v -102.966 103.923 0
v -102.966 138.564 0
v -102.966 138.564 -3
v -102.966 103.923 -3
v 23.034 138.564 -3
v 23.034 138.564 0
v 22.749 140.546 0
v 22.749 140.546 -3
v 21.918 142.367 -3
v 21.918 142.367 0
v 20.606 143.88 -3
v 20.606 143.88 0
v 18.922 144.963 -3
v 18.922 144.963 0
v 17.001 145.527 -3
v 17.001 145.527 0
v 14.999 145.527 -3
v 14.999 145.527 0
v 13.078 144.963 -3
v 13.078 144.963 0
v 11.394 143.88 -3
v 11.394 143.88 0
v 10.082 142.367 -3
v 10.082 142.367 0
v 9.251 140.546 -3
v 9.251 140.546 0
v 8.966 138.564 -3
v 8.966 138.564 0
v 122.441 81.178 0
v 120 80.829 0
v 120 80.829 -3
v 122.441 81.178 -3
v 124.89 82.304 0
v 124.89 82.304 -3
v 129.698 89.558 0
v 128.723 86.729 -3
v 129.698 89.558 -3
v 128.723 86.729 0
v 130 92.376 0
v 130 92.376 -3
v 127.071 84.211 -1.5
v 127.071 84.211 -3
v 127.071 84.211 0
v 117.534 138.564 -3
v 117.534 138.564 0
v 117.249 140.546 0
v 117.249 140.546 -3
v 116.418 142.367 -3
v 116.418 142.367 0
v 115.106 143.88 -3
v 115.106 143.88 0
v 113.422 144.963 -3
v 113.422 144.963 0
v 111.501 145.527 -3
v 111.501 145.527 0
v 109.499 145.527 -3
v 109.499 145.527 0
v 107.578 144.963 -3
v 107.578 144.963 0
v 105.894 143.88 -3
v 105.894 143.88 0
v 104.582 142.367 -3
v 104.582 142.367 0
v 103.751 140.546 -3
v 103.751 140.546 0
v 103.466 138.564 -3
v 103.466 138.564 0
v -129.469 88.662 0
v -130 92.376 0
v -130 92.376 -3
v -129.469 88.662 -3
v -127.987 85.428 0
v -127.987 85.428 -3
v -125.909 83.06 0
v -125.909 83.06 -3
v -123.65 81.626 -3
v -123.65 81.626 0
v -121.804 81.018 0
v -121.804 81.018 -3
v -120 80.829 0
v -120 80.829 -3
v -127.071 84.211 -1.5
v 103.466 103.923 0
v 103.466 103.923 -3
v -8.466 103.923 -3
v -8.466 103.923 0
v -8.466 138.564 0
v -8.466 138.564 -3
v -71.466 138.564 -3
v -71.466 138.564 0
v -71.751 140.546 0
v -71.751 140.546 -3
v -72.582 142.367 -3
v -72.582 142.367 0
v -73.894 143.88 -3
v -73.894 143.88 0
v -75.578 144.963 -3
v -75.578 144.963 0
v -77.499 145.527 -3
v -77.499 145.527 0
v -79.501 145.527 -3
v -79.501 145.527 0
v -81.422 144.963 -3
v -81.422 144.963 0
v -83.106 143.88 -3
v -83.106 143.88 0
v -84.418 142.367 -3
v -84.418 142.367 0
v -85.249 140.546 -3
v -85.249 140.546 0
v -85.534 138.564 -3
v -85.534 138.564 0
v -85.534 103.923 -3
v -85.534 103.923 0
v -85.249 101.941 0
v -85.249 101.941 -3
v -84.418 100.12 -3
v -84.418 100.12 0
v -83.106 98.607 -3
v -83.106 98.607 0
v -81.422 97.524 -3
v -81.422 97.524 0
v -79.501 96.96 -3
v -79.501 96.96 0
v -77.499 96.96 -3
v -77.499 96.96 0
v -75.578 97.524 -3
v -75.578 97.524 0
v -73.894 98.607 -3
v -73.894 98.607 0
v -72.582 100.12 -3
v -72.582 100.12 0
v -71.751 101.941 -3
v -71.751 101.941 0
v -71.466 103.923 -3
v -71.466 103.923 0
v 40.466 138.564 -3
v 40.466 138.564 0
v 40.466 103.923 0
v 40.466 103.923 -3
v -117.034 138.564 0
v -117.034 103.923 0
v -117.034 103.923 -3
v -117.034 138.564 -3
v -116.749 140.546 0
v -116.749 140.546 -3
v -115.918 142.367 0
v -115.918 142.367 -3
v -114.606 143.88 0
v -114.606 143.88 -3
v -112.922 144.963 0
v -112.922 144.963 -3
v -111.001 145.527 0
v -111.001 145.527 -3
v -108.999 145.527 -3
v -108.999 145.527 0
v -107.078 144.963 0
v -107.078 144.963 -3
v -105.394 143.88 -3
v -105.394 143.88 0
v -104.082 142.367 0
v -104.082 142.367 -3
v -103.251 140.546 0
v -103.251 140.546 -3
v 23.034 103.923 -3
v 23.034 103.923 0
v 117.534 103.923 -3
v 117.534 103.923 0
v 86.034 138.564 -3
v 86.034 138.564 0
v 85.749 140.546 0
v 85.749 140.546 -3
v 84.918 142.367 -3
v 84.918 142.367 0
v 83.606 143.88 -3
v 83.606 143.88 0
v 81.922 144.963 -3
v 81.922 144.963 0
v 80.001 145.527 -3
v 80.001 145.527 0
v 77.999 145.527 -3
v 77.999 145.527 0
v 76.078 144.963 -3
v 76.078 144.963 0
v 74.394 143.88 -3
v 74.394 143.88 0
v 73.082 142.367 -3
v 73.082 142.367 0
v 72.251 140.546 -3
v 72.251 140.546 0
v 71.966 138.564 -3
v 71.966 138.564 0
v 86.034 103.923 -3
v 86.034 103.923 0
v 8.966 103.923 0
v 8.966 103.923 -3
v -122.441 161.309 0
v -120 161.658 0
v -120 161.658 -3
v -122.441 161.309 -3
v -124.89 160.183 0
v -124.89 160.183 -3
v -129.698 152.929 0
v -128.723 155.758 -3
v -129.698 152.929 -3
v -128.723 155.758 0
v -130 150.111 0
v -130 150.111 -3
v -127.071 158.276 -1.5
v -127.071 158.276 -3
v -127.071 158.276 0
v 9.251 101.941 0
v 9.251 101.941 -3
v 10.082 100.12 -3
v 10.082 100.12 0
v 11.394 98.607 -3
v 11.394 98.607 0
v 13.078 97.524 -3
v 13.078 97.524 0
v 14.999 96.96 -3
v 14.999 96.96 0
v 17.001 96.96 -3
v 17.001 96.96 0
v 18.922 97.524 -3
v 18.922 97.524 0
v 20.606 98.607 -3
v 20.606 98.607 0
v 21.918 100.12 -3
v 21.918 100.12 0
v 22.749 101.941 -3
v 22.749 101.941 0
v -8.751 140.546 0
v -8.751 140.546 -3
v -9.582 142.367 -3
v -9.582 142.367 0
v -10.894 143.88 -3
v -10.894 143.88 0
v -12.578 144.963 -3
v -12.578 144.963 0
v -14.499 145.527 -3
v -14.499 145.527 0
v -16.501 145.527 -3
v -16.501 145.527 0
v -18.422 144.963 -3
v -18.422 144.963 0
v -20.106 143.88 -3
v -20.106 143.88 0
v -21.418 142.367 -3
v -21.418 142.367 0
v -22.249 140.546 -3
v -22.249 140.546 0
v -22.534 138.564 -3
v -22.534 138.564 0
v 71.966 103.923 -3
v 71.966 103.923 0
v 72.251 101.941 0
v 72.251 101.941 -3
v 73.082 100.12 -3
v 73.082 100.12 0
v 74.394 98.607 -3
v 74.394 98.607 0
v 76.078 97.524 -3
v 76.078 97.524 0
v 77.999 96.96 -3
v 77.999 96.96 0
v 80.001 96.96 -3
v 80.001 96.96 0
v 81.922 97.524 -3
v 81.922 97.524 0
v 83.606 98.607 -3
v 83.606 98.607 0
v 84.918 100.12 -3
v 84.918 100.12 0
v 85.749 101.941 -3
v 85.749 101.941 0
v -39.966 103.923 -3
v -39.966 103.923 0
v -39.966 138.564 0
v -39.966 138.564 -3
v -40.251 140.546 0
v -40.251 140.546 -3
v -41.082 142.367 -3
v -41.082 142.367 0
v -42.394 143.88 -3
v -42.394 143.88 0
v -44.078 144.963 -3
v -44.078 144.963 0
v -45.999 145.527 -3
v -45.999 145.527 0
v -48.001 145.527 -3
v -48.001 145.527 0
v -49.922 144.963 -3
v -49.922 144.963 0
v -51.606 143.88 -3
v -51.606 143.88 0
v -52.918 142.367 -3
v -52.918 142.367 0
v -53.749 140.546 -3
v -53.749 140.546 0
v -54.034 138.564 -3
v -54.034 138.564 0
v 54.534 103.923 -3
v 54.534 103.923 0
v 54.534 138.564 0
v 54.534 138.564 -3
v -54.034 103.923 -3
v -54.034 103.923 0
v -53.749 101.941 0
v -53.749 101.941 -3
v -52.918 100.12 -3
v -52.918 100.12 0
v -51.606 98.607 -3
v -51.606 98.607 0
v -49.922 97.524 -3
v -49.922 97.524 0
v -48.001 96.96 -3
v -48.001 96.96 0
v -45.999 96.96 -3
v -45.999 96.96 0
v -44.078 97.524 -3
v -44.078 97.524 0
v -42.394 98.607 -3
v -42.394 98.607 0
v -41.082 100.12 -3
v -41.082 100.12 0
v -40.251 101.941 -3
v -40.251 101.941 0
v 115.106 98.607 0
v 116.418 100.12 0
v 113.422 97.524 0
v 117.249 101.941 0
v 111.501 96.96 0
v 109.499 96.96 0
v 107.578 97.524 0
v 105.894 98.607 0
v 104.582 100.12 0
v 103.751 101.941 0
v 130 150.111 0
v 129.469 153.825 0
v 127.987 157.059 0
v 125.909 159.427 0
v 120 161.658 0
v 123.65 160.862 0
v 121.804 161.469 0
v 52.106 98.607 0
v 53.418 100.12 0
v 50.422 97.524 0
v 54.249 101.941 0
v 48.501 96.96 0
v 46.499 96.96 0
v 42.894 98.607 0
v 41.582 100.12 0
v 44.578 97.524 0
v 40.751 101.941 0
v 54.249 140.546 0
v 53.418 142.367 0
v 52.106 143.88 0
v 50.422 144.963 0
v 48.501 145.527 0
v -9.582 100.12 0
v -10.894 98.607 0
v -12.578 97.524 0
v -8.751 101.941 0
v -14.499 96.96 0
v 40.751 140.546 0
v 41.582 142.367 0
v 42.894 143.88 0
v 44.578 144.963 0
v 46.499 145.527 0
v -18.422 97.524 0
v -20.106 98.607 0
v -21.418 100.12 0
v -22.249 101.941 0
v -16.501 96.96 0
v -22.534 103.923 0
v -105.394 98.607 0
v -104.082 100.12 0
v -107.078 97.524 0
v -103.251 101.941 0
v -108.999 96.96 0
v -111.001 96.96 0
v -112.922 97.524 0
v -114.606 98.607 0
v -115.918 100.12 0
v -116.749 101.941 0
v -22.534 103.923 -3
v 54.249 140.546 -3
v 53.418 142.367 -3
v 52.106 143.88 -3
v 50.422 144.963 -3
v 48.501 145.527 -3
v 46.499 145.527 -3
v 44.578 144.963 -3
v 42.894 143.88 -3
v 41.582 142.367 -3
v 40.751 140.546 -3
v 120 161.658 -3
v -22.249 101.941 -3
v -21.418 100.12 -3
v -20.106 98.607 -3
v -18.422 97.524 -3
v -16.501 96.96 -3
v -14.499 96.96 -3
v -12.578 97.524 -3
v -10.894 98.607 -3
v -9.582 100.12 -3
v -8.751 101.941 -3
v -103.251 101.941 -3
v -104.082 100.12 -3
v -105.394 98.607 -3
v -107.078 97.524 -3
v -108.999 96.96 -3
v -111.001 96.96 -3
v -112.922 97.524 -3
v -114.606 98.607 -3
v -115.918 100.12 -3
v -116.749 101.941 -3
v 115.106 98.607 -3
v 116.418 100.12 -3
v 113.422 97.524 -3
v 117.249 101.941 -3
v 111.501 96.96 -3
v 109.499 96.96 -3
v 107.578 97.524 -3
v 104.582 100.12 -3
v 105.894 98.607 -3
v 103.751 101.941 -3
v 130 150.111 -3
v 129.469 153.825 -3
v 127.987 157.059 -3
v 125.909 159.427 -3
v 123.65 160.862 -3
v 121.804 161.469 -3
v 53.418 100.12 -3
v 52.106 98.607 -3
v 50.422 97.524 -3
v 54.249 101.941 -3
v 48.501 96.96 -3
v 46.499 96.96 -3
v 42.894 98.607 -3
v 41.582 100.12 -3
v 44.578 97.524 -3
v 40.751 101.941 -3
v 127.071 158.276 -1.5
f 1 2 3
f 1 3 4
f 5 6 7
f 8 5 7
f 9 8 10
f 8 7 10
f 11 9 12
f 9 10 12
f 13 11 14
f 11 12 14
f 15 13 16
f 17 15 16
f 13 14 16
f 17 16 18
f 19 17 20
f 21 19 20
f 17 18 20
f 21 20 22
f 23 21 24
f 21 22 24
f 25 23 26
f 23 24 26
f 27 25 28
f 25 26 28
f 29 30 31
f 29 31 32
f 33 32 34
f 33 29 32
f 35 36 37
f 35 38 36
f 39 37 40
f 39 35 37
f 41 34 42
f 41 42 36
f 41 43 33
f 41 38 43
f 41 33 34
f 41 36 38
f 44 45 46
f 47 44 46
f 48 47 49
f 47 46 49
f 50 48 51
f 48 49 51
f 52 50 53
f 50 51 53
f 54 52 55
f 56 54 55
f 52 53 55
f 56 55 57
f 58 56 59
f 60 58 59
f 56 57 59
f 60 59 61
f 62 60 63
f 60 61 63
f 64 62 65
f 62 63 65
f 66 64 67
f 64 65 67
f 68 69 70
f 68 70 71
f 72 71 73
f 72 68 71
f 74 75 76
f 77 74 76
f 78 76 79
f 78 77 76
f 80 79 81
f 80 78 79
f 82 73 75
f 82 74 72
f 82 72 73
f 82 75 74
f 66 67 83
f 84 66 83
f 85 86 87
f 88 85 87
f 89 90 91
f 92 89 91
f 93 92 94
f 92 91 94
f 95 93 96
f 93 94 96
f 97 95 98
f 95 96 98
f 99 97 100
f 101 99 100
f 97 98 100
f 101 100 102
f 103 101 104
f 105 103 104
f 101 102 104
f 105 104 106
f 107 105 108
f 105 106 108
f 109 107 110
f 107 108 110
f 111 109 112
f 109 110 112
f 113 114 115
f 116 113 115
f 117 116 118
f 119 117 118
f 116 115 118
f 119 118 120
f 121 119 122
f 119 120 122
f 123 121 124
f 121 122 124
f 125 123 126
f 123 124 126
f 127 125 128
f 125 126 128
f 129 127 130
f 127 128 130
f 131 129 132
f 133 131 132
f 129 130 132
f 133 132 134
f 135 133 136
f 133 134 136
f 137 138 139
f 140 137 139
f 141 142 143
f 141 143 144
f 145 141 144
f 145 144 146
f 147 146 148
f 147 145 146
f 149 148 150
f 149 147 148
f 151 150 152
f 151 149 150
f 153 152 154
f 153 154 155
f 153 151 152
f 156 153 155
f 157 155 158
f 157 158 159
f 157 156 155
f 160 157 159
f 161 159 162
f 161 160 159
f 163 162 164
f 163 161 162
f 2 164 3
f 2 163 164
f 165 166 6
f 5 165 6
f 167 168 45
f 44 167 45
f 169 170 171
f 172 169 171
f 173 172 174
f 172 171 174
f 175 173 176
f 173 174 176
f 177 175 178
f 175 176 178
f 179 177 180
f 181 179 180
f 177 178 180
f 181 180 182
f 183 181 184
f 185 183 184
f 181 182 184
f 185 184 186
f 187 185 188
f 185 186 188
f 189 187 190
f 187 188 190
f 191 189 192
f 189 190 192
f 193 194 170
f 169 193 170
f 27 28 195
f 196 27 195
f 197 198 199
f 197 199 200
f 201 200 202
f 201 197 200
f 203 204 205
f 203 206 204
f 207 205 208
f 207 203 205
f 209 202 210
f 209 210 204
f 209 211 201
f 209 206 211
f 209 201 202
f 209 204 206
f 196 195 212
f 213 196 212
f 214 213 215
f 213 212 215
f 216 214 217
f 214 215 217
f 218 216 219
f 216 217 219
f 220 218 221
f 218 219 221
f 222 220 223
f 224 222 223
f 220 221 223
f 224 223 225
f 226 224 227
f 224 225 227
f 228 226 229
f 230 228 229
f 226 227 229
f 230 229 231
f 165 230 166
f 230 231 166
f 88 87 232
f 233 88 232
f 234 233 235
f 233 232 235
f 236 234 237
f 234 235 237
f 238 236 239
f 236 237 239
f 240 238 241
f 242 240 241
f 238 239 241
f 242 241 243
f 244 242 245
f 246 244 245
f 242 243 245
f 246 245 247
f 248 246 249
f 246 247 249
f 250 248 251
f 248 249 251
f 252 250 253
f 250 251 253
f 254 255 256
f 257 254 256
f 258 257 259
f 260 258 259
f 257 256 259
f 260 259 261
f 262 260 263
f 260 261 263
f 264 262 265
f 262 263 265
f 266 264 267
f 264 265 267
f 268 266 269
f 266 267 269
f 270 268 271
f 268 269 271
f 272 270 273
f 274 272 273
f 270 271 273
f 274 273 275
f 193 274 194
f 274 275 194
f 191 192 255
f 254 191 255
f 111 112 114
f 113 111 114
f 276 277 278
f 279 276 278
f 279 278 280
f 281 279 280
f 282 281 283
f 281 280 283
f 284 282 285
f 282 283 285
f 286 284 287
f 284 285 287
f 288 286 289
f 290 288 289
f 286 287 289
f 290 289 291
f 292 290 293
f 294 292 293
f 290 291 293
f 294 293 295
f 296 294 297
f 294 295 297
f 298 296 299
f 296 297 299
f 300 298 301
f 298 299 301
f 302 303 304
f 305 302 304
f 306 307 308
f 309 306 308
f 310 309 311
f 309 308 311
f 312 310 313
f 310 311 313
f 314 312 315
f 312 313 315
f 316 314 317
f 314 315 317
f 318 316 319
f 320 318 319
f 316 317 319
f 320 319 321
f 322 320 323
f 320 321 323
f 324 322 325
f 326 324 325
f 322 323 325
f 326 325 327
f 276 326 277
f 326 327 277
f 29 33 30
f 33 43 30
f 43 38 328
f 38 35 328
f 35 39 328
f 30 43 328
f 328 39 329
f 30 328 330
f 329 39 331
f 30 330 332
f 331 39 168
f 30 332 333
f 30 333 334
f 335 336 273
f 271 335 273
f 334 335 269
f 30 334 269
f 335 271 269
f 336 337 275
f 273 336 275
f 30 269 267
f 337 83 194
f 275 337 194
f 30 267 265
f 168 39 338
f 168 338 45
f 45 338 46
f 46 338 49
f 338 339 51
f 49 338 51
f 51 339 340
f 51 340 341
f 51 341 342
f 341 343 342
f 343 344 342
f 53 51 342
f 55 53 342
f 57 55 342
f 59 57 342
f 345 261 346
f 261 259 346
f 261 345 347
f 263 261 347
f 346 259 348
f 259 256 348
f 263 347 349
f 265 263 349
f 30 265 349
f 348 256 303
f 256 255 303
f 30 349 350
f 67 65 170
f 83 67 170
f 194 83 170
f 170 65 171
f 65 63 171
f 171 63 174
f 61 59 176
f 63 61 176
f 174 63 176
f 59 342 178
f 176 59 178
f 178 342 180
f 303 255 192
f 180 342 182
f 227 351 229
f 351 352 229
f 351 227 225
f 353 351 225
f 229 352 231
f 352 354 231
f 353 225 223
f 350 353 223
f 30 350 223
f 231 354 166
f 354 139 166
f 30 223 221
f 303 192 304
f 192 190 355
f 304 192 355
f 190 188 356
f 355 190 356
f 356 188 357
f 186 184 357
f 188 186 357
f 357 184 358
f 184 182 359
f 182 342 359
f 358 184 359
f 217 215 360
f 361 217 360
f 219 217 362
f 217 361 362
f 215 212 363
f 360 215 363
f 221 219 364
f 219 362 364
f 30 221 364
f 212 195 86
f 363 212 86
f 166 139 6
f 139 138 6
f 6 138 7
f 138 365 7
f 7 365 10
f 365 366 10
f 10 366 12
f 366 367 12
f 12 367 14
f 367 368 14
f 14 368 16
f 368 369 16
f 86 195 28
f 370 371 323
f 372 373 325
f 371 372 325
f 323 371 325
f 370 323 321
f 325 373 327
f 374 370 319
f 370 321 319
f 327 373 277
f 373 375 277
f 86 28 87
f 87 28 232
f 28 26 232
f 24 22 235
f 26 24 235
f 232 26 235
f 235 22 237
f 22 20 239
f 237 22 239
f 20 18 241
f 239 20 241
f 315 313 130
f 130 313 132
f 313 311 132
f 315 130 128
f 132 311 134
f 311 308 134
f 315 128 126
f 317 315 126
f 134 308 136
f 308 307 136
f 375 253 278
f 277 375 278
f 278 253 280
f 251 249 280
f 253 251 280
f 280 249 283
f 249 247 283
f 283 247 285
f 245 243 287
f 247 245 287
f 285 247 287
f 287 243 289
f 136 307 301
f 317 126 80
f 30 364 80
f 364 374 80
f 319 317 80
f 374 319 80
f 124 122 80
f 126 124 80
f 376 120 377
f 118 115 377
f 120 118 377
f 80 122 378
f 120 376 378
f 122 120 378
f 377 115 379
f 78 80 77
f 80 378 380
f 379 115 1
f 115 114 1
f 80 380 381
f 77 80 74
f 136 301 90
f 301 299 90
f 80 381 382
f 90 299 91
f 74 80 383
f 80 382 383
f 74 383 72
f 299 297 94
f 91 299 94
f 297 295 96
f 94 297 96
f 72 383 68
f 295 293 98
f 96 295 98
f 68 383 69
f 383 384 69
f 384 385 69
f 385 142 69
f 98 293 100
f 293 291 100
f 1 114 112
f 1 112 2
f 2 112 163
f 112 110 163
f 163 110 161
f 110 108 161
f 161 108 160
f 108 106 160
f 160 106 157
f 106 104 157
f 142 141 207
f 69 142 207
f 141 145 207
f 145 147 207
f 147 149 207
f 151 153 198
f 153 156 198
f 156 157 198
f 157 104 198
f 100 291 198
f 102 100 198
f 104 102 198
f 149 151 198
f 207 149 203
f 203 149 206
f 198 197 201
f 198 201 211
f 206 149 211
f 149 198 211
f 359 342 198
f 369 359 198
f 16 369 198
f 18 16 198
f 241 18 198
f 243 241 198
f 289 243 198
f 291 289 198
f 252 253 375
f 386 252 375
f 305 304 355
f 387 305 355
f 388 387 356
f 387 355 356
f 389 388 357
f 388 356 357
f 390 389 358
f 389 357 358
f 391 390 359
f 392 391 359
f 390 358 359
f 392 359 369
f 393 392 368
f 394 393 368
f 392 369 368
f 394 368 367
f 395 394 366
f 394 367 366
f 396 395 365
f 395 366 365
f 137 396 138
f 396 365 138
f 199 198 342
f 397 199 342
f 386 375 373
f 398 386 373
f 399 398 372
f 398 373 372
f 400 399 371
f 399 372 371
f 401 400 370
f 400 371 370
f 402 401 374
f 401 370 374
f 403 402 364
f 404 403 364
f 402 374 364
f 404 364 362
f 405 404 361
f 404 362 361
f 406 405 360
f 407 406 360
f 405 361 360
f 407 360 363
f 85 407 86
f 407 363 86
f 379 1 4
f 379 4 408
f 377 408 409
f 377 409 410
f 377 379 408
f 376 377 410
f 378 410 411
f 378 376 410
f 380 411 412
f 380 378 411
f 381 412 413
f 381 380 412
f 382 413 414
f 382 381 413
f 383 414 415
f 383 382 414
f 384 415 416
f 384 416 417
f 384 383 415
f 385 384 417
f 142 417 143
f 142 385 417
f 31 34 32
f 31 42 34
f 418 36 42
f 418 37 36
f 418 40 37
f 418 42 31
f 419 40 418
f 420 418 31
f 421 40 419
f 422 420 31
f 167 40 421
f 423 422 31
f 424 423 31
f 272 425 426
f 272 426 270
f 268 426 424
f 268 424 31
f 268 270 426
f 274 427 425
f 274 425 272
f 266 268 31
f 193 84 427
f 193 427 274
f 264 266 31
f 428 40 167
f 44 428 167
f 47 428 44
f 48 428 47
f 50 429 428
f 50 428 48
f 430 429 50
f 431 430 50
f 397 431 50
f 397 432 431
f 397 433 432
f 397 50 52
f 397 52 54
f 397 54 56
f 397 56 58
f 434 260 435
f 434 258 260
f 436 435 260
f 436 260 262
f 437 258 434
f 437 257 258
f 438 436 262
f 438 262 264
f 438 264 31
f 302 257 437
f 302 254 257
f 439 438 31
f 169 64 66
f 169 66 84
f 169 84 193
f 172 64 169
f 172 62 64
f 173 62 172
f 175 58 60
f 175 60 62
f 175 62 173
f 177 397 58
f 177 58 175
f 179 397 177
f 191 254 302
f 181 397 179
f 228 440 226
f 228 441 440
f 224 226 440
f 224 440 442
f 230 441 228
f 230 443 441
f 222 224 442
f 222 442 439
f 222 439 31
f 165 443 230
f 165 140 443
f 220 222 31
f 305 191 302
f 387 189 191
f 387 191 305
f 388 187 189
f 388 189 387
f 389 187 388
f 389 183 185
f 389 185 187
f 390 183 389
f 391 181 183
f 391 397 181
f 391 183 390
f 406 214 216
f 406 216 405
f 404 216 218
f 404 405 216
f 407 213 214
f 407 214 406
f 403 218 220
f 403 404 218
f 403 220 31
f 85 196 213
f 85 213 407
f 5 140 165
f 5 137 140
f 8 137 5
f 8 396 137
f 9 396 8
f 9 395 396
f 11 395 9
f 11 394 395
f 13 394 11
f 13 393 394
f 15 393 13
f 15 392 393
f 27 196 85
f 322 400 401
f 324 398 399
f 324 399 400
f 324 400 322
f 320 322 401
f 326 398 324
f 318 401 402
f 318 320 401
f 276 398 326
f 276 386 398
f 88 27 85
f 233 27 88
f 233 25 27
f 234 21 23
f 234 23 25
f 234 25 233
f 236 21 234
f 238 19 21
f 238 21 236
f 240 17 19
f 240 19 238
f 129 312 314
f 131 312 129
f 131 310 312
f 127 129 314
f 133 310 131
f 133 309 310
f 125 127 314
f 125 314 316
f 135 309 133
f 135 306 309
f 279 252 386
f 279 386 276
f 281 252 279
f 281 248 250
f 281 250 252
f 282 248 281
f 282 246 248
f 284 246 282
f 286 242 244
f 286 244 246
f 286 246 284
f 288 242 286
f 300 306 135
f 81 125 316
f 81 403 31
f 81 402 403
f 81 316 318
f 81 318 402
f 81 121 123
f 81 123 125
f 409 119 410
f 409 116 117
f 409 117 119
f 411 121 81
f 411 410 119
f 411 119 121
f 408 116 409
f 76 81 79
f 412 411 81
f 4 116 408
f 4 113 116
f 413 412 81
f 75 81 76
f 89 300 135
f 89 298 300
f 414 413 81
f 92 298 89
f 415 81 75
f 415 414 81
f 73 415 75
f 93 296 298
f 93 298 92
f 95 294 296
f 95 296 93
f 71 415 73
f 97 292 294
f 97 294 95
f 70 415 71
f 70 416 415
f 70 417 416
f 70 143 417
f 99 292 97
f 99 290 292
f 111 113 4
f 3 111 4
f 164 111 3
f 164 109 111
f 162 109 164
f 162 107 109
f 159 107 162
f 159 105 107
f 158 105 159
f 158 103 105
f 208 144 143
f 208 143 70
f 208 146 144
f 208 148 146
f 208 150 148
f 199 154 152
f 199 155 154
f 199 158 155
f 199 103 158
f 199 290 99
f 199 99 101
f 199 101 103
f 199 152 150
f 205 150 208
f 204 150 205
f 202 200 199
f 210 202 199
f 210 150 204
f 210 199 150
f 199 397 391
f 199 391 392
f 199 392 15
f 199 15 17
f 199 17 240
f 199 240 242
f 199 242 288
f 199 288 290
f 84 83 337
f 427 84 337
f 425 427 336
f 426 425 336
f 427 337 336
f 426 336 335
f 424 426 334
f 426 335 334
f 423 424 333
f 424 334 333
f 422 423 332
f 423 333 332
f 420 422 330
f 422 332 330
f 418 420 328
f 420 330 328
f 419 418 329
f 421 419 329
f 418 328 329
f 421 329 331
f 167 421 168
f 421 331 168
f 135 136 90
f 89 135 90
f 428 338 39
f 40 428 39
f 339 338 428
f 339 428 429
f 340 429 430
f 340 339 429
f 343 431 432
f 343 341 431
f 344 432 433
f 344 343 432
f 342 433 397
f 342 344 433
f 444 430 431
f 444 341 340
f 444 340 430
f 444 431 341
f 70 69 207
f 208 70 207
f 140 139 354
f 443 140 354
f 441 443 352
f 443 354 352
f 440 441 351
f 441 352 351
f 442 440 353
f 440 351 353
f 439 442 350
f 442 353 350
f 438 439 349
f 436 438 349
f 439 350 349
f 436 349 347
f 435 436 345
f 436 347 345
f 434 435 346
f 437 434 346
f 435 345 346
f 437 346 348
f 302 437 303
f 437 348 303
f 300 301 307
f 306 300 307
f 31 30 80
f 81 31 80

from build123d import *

# Parameters (mm, degrees)
BOSS_EXTRUDE1_DEPTH = 3


with BuildPart() as part:
    # Sketch1 → Boss-Extrude1 (new body)
    with BuildSketch(Plane.XY):
        with BuildLine():
            Line((120, 80.829037687), (-120, 80.829037687))
            add(Edge.make_bspline(
                [(-130, 92.37604307), (-130, 80.829037687), (-120, 80.829037687)],
                knots=[1.570796327, 1.570796327, 1.570796327, 3.141592654, 3.141592654, 3.141592654], degree=2, weights=[1, 0.707106781, 1]))
            Line((-130, 92.37604307), (-130, 150.111069989))
            add(Edge.make_bspline(
                [(-120, 161.658075373), (-130, 161.658075373), (-130, 150.111069989)],
                knots=[0, 0, 0, 1.570796327, 1.570796327, 1.570796327], degree=2, weights=[1, 0.707106781, 1]))
            Line((-120, 161.658075373), (120, 161.658075373))
            add(Edge.make_bspline(
                [(130, 150.111069989), (130, 161.658075373), (120, 161.658075373)],
                knots=[4.71238898, 4.71238898, 4.71238898, 6.283185307, 6.283185307, 6.283185307], degree=2, weights=[1, 0.707106781, 1]))
            Line((130, 150.111069989), (130, 92.37604307))
            add(Edge.make_bspline(
                [(120, 80.829037687), (130, 80.829037687), (130, 92.37604307)],
                knots=[3.141592654, 3.141592654, 3.141592654, 4.71238898, 4.71238898, 4.71238898], degree=2, weights=[1, 0.707106781, 1]))
        make_face()
        with BuildLine():
            Line((-102.965755224, 138.564064606), (-102.965755224, 103.923048454))
            ThreePointArc((-102.965755224, 103.923048454), (-110, 96.888803678), (-117.034244776, 103.923048454))
            Line((-117.034244776, 103.923048454), (-117.034244776, 138.564064606))
            ThreePointArc((-117.034244776, 138.564064606), (-110, 145.598309381), (-102.965755224, 138.564064606))
        make_face(mode=Mode.SUBTRACT)
        with BuildLine():
            Line((-85.534244776, 138.564064606), (-85.534244776, 103.923048454))
            ThreePointArc((-85.534244776, 103.923048454), (-78.5, 96.888803678), (-71.465755224, 103.923048454))
            Line((-71.465755224, 103.923048454), (-71.465755224, 138.564064606))
            ThreePointArc((-71.465755224, 138.564064606), (-78.5, 145.598309381), (-85.534244776, 138.564064606))
        make_face(mode=Mode.SUBTRACT)
        with BuildLine():
            Line((-54.034244776, 138.564064606), (-54.034244776, 103.923048454))
            ThreePointArc((-54.034244776, 103.923048454), (-47, 96.888803678), (-39.965755224, 103.923048454))
            Line((-39.965755224, 103.923048454), (-39.965755224, 138.564064606))
            ThreePointArc((-39.965755224, 138.564064606), (-47, 145.598309381), (-54.034244776, 138.564064606))
        make_face(mode=Mode.SUBTRACT)
        with BuildLine():
            Line((-22.534244776, 138.564064606), (-22.534244776, 103.923048454))
            ThreePointArc((-22.534244776, 103.923048454), (-15.5, 96.888803678), (-8.465755224, 103.923048454))
            Line((-8.465755224, 103.923048454), (-8.465755224, 138.564064606))
            ThreePointArc((-8.465755224, 138.564064606), (-15.5, 145.598309381), (-22.534244776, 138.564064606))
        make_face(mode=Mode.SUBTRACT)
        with BuildLine():
            Line((8.965755224, 138.564064606), (8.965755224, 103.923048454))
            ThreePointArc((8.965755224, 103.923048454), (16, 96.888803678), (23.034244776, 103.923048454))
            Line((23.034244776, 103.923048454), (23.034244776, 138.564064606))
            ThreePointArc((23.034244776, 138.564064606), (16, 145.598309381), (8.965755224, 138.564064606))
        make_face(mode=Mode.SUBTRACT)
        with BuildLine():
            Line((40.465755224, 138.564064606), (40.465755224, 103.923048454))
            ThreePointArc((40.465755224, 103.923048454), (47.5, 96.888803678), (54.534244776, 103.923048454))
            Line((54.534244776, 103.923048454), (54.534244776, 138.564064606))
            ThreePointArc((54.534244776, 138.564064606), (47.5, 145.598309381), (40.465755224, 138.564064606))
        make_face(mode=Mode.SUBTRACT)
        with BuildLine():
            Line((71.965755224, 138.564064606), (71.965755224, 103.923048454))
            ThreePointArc((71.965755224, 103.923048454), (79, 96.888803678), (86.034244776, 103.923048454))
            Line((86.034244776, 103.923048454), (86.034244776, 138.564064606))
            ThreePointArc((86.034244776, 138.564064606), (79, 145.598309381), (71.965755224, 138.564064606))
        make_face(mode=Mode.SUBTRACT)
        with BuildLine():
            Line((103.465755224, 138.564064606), (103.465755224, 103.923048454))
            ThreePointArc((103.465755224, 103.923048454), (110.5, 96.888803678), (117.534244776, 103.923048454))
            Line((117.534244776, 103.923048454), (117.534244776, 138.564064606))
            ThreePointArc((117.534244776, 138.564064606), (110.5, 145.598309381), (103.465755224, 138.564064606))
        make_face(mode=Mode.SUBTRACT)
    extrude(amount=-BOSS_EXTRUDE1_DEPTH)


solid = part.part
